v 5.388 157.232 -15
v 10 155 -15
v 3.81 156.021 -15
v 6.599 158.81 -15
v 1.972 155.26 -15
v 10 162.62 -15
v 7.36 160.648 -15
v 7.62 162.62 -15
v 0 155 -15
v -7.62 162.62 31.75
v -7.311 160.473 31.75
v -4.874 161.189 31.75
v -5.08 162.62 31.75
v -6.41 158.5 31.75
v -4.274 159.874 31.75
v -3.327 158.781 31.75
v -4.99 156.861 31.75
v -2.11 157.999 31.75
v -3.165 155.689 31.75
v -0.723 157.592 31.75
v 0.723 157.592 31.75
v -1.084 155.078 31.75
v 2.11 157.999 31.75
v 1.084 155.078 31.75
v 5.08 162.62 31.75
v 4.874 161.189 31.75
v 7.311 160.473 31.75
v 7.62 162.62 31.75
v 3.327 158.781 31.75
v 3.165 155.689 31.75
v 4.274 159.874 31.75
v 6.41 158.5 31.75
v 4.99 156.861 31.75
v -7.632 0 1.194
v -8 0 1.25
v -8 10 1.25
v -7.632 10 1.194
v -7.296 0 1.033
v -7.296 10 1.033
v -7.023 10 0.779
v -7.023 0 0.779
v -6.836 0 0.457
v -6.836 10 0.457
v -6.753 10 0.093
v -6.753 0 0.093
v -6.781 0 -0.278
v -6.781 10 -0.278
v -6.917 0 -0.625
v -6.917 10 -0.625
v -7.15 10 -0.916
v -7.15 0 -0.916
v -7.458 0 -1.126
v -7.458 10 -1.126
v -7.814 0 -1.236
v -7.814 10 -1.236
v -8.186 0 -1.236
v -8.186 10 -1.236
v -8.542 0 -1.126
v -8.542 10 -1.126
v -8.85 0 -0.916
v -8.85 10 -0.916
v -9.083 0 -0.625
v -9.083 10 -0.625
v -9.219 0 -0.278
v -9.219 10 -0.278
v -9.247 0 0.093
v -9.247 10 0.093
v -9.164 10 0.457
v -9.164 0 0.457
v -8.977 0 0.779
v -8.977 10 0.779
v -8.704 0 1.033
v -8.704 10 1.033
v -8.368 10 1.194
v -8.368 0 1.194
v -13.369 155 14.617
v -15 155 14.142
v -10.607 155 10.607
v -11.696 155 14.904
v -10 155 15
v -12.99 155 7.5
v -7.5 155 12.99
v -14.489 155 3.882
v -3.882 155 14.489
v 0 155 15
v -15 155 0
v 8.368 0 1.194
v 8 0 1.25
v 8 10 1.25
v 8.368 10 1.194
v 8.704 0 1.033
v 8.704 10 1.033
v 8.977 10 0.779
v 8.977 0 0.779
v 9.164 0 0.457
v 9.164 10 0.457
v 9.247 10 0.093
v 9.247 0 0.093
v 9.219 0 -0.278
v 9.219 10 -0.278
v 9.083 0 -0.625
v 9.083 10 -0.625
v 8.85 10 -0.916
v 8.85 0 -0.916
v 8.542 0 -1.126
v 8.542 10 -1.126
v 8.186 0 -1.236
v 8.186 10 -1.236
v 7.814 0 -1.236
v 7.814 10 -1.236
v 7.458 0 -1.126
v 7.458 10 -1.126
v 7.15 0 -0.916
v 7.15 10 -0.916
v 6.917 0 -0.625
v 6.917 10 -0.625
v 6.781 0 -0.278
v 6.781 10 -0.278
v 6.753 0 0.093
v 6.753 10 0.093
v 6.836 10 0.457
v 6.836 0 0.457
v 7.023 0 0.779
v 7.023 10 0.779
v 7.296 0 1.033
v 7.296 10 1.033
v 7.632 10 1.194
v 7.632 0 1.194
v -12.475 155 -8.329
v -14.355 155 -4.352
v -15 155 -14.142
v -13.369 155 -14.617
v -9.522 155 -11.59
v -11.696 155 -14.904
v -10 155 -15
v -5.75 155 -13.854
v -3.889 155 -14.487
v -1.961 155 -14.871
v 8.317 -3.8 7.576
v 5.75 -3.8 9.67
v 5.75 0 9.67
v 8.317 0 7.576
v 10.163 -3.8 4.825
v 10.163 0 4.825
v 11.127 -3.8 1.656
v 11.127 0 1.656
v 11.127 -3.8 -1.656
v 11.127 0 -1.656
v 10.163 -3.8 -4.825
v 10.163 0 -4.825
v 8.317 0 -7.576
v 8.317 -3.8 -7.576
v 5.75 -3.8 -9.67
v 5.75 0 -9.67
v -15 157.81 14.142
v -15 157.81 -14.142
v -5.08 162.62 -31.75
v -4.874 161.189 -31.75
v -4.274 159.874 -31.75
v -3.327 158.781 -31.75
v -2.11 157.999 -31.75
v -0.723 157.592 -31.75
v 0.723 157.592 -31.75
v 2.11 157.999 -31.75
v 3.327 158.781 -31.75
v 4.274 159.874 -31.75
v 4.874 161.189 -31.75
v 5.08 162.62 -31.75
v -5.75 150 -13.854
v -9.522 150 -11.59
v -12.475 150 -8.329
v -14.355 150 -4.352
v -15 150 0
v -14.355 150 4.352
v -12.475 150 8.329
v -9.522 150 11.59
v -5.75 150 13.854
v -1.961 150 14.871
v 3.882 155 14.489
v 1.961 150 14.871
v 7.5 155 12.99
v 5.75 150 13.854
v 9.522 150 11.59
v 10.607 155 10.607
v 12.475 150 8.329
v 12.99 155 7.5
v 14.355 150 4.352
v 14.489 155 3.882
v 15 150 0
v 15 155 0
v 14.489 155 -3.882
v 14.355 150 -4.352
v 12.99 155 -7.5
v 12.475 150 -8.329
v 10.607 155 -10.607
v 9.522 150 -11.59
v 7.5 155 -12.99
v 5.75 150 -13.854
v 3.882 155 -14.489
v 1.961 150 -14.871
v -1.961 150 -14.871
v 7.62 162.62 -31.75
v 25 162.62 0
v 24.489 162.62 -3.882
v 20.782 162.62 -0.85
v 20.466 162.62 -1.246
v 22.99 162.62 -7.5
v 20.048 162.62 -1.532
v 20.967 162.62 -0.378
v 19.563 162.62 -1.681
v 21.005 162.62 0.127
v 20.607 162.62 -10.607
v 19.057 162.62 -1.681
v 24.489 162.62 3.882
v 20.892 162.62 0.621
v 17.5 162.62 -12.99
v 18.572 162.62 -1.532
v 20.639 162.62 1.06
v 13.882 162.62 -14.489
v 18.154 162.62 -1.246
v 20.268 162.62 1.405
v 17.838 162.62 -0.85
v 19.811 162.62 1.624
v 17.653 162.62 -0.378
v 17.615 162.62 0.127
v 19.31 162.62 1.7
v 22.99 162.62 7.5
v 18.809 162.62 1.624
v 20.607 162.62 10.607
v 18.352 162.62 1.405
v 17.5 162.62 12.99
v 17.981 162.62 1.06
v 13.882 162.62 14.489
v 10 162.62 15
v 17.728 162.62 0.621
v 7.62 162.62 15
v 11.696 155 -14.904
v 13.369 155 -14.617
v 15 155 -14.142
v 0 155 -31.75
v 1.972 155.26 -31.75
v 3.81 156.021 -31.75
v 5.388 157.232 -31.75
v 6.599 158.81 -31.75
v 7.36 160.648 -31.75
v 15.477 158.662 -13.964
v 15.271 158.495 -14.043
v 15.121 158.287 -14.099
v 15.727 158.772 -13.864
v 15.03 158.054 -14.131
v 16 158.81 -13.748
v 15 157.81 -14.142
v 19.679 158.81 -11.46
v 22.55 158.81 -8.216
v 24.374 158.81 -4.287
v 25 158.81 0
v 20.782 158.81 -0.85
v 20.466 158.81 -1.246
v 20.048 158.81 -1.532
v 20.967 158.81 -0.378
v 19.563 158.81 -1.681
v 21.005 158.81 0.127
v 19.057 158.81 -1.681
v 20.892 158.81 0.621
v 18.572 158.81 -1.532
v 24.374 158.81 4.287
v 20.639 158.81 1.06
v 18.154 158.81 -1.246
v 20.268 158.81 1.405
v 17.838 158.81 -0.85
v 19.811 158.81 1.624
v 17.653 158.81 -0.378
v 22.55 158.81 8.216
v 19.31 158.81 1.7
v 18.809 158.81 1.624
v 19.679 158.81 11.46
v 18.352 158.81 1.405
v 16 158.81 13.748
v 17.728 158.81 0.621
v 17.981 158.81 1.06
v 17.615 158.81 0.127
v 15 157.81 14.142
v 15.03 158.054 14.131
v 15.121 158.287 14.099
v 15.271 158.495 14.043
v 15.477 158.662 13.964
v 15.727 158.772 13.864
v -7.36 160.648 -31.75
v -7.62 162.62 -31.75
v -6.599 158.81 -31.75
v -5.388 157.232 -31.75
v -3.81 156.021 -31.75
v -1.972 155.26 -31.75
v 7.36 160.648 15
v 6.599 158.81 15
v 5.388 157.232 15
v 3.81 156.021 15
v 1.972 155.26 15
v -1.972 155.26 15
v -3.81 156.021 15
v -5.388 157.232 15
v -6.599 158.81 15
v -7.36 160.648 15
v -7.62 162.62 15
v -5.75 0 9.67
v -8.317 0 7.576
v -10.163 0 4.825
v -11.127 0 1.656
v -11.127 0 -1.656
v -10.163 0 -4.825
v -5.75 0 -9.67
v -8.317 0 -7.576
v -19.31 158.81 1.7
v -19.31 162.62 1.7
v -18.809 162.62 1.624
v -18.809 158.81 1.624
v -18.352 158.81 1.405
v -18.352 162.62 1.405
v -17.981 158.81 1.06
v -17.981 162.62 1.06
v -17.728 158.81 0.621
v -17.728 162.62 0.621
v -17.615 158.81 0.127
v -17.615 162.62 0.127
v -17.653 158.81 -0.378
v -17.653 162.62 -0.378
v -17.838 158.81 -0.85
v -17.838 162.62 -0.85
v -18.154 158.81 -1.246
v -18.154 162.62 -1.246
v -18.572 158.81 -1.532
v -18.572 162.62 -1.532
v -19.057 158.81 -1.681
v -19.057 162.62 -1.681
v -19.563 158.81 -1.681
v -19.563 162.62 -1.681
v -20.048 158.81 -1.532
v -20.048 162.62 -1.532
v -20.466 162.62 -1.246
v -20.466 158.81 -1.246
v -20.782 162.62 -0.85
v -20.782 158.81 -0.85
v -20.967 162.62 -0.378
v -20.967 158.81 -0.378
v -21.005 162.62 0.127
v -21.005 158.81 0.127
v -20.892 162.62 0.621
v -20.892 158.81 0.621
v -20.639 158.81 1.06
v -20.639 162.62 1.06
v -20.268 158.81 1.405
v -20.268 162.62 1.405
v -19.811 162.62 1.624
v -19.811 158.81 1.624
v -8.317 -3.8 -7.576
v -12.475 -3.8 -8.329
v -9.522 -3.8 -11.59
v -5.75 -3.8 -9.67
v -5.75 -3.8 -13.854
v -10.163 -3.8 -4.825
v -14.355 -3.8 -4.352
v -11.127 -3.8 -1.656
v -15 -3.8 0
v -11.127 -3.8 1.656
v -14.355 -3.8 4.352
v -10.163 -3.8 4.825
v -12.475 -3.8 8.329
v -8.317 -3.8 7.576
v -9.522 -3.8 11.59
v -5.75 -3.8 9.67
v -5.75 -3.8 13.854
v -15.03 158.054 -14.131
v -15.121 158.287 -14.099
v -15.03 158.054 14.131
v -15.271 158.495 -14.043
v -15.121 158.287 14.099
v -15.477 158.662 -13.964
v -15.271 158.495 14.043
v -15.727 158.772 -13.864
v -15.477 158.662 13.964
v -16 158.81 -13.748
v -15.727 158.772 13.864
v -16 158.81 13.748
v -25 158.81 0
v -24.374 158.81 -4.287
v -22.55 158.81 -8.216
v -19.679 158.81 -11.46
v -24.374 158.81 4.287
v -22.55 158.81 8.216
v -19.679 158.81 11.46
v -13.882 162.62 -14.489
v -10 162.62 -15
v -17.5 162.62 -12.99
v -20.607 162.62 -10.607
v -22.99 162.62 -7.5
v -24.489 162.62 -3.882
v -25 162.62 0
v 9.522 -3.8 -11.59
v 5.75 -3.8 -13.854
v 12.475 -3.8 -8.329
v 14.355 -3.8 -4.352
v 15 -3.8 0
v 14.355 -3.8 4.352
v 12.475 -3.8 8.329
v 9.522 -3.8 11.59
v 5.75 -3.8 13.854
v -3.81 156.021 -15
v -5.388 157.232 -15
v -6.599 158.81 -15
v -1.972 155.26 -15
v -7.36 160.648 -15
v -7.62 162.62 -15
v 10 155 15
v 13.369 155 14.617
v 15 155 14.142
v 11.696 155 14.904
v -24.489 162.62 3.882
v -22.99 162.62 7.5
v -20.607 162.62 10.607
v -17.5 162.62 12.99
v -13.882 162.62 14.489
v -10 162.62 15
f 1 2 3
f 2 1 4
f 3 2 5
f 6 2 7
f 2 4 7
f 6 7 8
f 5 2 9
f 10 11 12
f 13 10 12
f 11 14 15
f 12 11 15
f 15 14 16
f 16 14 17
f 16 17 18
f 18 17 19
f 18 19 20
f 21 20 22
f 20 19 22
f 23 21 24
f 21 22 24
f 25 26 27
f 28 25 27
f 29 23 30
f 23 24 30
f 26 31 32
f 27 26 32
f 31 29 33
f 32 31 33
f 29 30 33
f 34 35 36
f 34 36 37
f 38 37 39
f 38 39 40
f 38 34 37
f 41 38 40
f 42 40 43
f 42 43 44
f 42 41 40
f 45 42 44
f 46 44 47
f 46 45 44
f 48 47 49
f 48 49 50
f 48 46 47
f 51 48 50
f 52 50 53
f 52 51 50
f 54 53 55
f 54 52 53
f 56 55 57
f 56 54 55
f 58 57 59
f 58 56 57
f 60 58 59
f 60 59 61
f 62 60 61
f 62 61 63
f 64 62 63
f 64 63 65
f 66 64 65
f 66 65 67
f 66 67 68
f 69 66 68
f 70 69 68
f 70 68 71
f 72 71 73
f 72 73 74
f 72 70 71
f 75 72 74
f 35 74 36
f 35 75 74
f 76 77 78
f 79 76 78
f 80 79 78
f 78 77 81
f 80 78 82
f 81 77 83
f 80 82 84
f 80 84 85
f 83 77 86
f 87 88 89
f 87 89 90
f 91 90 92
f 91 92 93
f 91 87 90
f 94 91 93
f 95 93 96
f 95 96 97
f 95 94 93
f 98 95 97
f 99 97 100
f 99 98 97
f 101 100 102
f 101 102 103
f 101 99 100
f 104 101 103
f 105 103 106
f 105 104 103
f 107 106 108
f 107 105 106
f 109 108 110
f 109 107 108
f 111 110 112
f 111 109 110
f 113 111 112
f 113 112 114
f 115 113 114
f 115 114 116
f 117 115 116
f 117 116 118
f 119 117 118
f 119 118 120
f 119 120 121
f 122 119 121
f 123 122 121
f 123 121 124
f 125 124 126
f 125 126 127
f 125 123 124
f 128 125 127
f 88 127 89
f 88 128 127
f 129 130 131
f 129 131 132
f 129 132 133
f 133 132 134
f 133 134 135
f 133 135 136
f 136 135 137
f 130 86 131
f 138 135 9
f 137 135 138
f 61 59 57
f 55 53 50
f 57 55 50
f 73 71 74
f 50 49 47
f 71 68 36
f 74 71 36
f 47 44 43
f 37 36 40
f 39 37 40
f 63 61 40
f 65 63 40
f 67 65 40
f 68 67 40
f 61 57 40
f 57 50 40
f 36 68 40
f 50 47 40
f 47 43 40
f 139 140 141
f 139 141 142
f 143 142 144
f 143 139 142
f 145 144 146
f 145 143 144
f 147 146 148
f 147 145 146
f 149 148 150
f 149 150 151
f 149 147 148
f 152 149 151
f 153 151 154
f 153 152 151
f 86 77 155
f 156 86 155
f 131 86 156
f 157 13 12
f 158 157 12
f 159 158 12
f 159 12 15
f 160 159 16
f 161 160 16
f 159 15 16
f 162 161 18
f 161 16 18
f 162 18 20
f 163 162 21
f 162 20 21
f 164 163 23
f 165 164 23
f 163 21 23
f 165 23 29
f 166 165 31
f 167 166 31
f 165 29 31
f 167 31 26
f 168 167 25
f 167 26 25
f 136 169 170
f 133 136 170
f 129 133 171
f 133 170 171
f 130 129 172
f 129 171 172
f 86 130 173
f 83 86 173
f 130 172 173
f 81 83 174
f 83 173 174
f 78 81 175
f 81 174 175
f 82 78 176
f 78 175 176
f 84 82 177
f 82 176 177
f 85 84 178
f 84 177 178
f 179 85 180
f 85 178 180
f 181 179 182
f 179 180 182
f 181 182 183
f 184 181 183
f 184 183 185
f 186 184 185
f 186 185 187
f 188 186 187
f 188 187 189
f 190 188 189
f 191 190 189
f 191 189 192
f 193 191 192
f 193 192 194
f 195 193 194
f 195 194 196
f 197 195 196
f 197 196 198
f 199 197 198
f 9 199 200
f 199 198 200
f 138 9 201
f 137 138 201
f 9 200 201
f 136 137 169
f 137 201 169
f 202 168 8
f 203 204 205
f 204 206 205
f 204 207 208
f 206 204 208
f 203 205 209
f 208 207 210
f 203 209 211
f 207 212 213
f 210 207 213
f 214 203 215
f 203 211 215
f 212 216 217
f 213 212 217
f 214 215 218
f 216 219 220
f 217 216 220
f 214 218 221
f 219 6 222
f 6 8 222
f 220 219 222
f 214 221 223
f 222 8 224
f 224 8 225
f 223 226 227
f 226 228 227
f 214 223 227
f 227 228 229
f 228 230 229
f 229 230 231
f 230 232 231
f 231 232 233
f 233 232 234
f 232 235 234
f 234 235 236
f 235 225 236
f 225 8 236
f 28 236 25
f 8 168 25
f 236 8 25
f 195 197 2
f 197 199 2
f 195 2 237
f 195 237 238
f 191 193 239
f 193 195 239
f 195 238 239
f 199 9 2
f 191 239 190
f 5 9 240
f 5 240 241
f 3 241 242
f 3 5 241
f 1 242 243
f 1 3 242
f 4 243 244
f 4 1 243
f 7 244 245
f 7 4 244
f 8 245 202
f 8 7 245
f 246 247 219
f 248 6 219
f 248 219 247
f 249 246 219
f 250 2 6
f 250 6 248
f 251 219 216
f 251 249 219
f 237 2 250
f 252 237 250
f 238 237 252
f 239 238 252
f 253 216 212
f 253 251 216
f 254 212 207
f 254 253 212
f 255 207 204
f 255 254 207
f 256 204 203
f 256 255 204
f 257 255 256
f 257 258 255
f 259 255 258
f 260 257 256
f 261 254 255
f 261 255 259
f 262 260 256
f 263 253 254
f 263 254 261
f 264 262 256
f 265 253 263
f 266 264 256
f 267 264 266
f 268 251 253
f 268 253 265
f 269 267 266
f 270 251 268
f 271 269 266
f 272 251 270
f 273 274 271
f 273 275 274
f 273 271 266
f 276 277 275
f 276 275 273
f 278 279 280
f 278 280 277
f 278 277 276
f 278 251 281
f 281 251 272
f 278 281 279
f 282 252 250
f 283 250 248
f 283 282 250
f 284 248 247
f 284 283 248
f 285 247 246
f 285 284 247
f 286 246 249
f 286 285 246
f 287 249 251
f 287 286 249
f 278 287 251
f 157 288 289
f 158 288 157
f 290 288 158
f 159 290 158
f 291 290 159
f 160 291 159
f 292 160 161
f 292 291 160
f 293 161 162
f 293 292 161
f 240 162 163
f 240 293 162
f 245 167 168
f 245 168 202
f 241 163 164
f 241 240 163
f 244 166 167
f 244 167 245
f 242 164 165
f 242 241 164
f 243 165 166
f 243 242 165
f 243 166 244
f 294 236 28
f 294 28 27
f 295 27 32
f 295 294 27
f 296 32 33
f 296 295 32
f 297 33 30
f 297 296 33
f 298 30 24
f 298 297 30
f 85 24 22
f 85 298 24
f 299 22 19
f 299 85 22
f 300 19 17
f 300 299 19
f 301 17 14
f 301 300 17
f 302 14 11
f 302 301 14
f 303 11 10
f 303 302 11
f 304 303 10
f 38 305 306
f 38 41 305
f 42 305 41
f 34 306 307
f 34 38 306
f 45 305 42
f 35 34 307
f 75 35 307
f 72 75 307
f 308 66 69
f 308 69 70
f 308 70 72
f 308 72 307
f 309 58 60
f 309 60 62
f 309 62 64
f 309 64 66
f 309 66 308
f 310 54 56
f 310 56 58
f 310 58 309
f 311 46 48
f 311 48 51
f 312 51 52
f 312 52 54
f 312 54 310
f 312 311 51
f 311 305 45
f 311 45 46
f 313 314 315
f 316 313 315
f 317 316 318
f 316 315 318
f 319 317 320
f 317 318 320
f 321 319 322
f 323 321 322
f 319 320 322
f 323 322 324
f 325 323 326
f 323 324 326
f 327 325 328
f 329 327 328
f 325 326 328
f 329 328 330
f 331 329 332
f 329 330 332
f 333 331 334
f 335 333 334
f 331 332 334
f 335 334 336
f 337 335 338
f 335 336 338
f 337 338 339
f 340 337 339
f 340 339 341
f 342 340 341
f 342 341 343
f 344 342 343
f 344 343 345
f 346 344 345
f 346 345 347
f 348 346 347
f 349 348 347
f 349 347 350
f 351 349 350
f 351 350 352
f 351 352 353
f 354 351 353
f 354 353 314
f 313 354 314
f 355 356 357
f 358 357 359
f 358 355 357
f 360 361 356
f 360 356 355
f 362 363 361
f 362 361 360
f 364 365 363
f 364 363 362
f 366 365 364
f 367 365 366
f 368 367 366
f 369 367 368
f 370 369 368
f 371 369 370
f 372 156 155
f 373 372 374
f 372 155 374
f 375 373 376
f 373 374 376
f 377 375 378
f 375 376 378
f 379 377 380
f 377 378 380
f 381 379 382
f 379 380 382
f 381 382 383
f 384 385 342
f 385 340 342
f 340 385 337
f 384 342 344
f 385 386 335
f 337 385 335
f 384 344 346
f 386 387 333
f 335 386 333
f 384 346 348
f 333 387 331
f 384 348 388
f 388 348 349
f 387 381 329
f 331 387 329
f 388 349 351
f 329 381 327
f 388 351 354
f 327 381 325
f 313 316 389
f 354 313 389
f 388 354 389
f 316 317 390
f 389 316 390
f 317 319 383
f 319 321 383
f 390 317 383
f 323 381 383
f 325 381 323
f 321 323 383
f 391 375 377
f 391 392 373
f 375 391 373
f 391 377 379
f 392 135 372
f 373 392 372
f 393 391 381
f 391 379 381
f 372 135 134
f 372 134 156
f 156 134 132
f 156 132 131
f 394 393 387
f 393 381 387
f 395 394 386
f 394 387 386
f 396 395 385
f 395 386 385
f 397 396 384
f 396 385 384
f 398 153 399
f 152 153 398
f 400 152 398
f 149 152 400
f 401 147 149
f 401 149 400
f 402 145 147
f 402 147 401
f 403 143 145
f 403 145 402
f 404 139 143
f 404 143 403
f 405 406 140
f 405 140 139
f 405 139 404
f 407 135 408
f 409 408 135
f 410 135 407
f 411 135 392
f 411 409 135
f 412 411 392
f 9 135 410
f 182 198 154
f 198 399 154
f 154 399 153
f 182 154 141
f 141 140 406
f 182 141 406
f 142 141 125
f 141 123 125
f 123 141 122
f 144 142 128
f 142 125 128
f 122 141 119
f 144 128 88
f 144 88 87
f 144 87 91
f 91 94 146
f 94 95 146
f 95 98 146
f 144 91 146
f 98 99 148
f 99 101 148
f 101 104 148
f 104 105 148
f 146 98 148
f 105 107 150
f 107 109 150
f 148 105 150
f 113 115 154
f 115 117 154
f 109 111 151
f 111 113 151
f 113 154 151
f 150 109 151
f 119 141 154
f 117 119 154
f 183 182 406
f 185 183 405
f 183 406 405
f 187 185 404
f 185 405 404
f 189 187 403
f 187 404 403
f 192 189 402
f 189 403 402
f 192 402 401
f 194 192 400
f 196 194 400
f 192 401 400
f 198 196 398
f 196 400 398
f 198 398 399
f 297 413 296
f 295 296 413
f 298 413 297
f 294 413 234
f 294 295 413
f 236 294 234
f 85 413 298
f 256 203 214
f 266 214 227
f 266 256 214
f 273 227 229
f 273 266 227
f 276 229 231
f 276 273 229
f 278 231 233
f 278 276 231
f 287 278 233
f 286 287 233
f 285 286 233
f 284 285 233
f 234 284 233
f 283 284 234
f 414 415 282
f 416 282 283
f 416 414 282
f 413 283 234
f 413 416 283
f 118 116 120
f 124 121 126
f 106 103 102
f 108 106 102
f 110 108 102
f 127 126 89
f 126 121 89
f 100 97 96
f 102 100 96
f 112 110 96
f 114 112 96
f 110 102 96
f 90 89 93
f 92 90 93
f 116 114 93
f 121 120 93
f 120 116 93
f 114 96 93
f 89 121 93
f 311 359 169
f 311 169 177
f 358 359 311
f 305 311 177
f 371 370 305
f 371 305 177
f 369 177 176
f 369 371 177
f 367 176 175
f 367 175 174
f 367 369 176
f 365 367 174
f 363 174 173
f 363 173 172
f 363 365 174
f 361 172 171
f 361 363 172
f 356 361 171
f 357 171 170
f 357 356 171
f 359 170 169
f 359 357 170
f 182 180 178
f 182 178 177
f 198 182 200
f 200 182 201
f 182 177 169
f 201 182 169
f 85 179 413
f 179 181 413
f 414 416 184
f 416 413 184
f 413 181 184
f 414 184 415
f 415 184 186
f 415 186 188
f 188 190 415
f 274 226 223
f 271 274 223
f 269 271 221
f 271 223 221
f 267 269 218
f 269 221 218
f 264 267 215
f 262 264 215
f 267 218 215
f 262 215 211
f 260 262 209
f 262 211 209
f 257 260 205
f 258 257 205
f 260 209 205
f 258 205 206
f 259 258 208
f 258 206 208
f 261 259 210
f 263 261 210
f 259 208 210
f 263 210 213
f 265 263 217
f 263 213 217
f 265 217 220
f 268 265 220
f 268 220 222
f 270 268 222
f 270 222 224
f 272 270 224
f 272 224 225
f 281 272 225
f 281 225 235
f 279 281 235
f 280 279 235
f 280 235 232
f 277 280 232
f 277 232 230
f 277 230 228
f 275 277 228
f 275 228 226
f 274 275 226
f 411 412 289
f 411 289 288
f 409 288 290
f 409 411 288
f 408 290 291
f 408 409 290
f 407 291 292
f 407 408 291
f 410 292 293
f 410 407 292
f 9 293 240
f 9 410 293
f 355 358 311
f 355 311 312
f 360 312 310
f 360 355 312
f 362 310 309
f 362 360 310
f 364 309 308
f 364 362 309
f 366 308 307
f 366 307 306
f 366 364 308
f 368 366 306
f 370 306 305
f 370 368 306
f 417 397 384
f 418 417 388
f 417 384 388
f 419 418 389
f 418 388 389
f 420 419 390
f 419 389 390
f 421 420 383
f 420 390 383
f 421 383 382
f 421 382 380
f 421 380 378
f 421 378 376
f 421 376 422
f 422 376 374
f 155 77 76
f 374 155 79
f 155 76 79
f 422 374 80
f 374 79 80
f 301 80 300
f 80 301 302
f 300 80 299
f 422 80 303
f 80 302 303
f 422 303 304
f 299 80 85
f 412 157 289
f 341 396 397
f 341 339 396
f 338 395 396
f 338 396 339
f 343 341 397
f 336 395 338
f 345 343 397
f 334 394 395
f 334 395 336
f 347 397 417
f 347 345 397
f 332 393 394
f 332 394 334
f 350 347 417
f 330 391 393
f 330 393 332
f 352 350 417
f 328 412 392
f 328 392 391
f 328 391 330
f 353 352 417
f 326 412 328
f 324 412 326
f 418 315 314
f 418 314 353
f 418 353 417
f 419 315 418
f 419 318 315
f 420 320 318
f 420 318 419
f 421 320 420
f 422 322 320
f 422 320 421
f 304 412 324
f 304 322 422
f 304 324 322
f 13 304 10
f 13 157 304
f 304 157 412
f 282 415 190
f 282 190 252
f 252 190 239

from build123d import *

# Parameters (mm, degrees)
BOSS_EXTRUDE1_DEPTH   = 150
BOSS_EXTRUDE1_2_DEPTH = 150
SKETCH2_R             = 15
BOSS_EXTRUDE2_DEPTH   = 5
SKETCH3_W             = 30
SKETCH3_H             = 63.5
BOSS_EXTRUDE3_DEPTH   = 15.24
SKETCH4_R             = 5.08
CUT_EXTRUDE1_DEPTH    = 183.315406919
CUT_EXTRUDE3_START    = -16.75
CUT_EXTRUDE3_DEPTH    = 16.75
CUT_EXTRUDE4_START    = -16.75
CUT_EXTRUDE4_DEPTH    = 16.75
SKETCH7_W             = 63.5
SKETCH7_H             = 7.62
CUT_EXTRUDE5_DEPTH    = 176.754715726
SKETCH8_W             = 30
SKETCH8_H             = 3.81
BOSS_EXTRUDE4_DEPTH   = 10
CUT_EXTRUDE6_START    = -7.62
CUT_EXTRUDE6_DEPTH    = 7.62
SKETCH1_4_R           = 1.25
CUT_EXTRUDE7_DEPTH    = 10
BOSS_EXTRUDE5_START   = 3.8
BOSS_EXTRUDE5_DEPTH   = 3.8
FILLET1_R             = 1
CUT_EXTRUDE8_REACH    = 173.256
SKETCH9_R             = 1.7


# Read off the part's stored shape, not the designer's step: Cut-Extrude6
with BuildPart() as part:
    # Sketch1 → Boss-Extrude1 (new body)
    with BuildSketch(Plane(origin=(0, 0, 0), x_dir=(1, 0, 0), z_dir=(0, 1, 0))):
        with BuildLine():
            Line((-5.75, 13.854151002), (-5.75, -13.854151002))
            ThreePointArc((-5.75, -13.854151002), (-15, 0), (-5.75, 13.854151002))
        make_face()
    extrude(amount=BOSS_EXTRUDE1_DEPTH)



with BuildPart() as body_2:
    # Sketch1 → Boss-Extrude1 2 (new body)
    with BuildSketch(Plane(origin=(0, 0, 0), x_dir=(1, 0, 0), z_dir=(0, 1, 0))):
        with BuildLine():
            Line((5.75, 13.854151002), (5.75, -13.854151002))
            ThreePointArc((5.75, -13.854151002), (15, 0), (5.75, 13.854151002))
        make_face()
    extrude(amount=BOSS_EXTRUDE1_2_DEPTH)


with BuildPart() as part_1:
    add(part.part)

    add(body_2.part)  # Boss-Extrude2 merges body 2
    # Sketch2 → Boss-Extrude2 (add)
    with BuildSketch(Plane(origin=(0, 150, 0), x_dir=(1, 0, 0), z_dir=(0, 1, 0))):
        with Locations(Location((0, 0, 0), (0, 0, 112.540310464))):
            Circle(SKETCH2_R)
    extrude(amount=BOSS_EXTRUDE2_DEPTH)

    # Sketch3 → Boss-Extrude3 (add)
    with BuildSketch(Plane(origin=(0, 155, 0), x_dir=(1, 0, 0), z_dir=(0, 1, 0))):
        Rectangle(SKETCH3_W, SKETCH3_H)
    extrude(amount=BOSS_EXTRUDE3_DEPTH)

    # Sketch4 → Cut-Extrude1 (cut, through all)
    with BuildSketch(Plane.XY.offset(31.75)):
        with Locations((0, 162.62)):
            Circle(SKETCH4_R)
    extrude(amount=-CUT_EXTRUDE1_DEPTH, mode=Mode.SUBTRACT)

    # Sketch6 → Cut-Extrude3 (cut)
    with BuildSketch(Plane(origin=(0, 0, -31.75), x_dir=(-1, 0, 0), z_dir=(0, 0, -1)).offset(CUT_EXTRUDE3_START)):
        with BuildLine():
            ThreePointArc((-9.9e-08, 170.24), (7.62, 162.62000005), (0, 155))
            Line((0, 155), (15, 155))
            Line((15, 155), (15, 170.24))
            Line((15, 170.24), (-9.9e-08, 170.24))
        make_face()
        with BuildLine():
            ThreePointArc((0, 155), (-7.62, 162.61999995), (-9.9e-08, 170.24))
            Line((-9.9e-08, 170.24), (-15, 170.24))
            Line((-15, 170.24), (-15, 155))
            Line((-15, 155), (0, 155))
        make_face()
    extrude(amount=CUT_EXTRUDE3_DEPTH, mode=Mode.SUBTRACT)

    # Sketch4<4> → Cut-Extrude4 (cut)
    with BuildSketch(Plane.XY.offset(31.75).offset(CUT_EXTRUDE4_START)):
        with BuildLine():
            ThreePointArc((-9.9e-08, 170.24), (7.62, 162.62000005), (0, 155))
            Line((0, 155), (15, 155))
            Line((15, 155), (15, 170.24))
            Line((15, 170.24), (-9.9e-08, 170.24))
        make_face()
        with BuildLine():
            ThreePointArc((0, 155), (-7.62, 162.61999995), (-9.9e-08, 170.24))
            Line((-9.9e-08, 170.24), (-15, 170.24))
            Line((-15, 170.24), (-15, 155))
            Line((-15, 155), (0, 155))
        make_face()
    extrude(amount=CUT_EXTRUDE4_DEPTH, mode=Mode.SUBTRACT)

    # Sketch7 → Cut-Extrude5 (cut, through all)
    with BuildSketch(Plane.ZY.offset(15)):
        with Locations((0, 166.43)):
            Rectangle(SKETCH7_W, SKETCH7_H)
    extrude(amount=-CUT_EXTRUDE5_DEPTH, mode=Mode.SUBTRACT)

    # Sketch8 → Boss-Extrude4 (add)
    with BuildSketch(Plane.ZY.offset(15)):
        with Locations((0, 160.715)):
            Rectangle(SKETCH8_W, SKETCH8_H)
    boss_extrude4 = extrude(amount=BOSS_EXTRUDE4_DEPTH)

    # Mirror2: Boss-Extrude4 across plane
    add(boss_extrude4.mirror(Plane(origin=(0, 0, 0), x_dir=(0, 0, 1), z_dir=(1, 0, 0))))

    # Cut-Extrude6 outline → Cut-Extrude6 (cut)
    with BuildSketch(Plane(origin=(0, 162.62, 0), x_dir=(1, 0, 0), z_dir=(0, 1, 0)).offset(CUT_EXTRUDE6_START)):
        with BuildLine():
            Line((25, 15), (10, 15))
            ThreePointArc((10, 15), (20.606601718, 10.606601718), (25, 0))
            Line((25, 0), (25, 15))
        make_face()
        with BuildLine():
            Line((25, -15), (25, 0))
            ThreePointArc((25, 0), (20.606601718, -10.606601718), (10, -15))
            Line((10, -15), (25, -15))
        make_face()
    cut_extrude6 = extrude(amount=CUT_EXTRUDE6_DEPTH, mode=Mode.SUBTRACT)

    # Mirror3: Cut-Extrude6 across plane
    add(cut_extrude6.mirror(Plane(origin=(0, 0, 0), x_dir=(0, 0, 1), z_dir=(1, 0, 0))), mode=Mode.SUBTRACT)

    # Sketch1<4> → Cut-Extrude7 (cut)
    with BuildSketch(Plane(origin=(0, 0, 0), x_dir=(1, 0, 0), z_dir=(0, 1, 0))):
        with Locations(Location((-8, 0, 0), (0, 0, 270))):
            Circle(SKETCH1_4_R)
        with Locations(Location((8, 0, 0), (0, 0, 270))):
            Circle(SKETCH1_4_R)
    extrude(amount=CUT_EXTRUDE7_DEPTH, mode=Mode.SUBTRACT)

    # Sketch12 → Boss-Extrude5 (add)
    with BuildSketch(Plane.XZ.offset(BOSS_EXTRUDE5_START)):
        with BuildLine():
            Line((-5.75, 9.669539803), (-5.75, 13.854151002))
            ThreePointArc((-5.75, 13.854151002), (-15, 0), (-5.75, -13.854151002))
            Line((-5.75, -13.854151002), (-5.75, -9.669539803))
            ThreePointArc((-5.75, -9.669539803), (-11.25, 0), (-5.75, 9.669539803))
        make_face()
        with BuildLine():
            ThreePointArc((5.75, -13.854151002), (15, 0), (5.75, 13.854151002))
            Line((5.75, 13.854151002), (5.75, 9.669539803))
            ThreePointArc((5.75, 9.669539803), (11.25, 0), (5.75, -9.669539803))
            Line((5.75, -9.669539803), (5.75, -13.854151002))
        make_face()
    extrude(amount=-BOSS_EXTRUDE5_DEPTH)

    # Fillet1
    fillet1_edges = [part_1.edges().sort_by_distance(p)[0] for p in [
        (15, 158.81, 0),
        (-15, 158.81, 0),
    ]]
    fillet(fillet1_edges, radius=FILLET1_R)

    # Sketch9 → Cut-Extrude8 (cut, up to next)
    with BuildSketch(Plane(origin=(0, 162.62, 0), x_dir=(1, 0, 0), z_dir=(0, 1, 0)), mode=Mode.PRIVATE) as cut_extrude8_sk1:
        with Locations(Location((-19.31, 0, 0), (0, 0, 270))):
            Circle(SKETCH9_R)
    cut_extrude8_tool1 = extrude(cut_extrude8_sk1.sketch, amount=-CUT_EXTRUDE8_REACH, mode=Mode.PRIVATE) & part_1.part
    # Sketch9 → Cut-Extrude8 (cut, up to next)
    with BuildSketch(Plane(origin=(0, 162.62, 0), x_dir=(1, 0, 0), z_dir=(0, 1, 0)), mode=Mode.PRIVATE) as cut_extrude8_sk2:
        with Locations(Location((19.31, 0, 0), (0, 0, 270))):
            Circle(SKETCH9_R)
    cut_extrude8_tool2 = extrude(cut_extrude8_sk2.sketch, amount=-CUT_EXTRUDE8_REACH, mode=Mode.PRIVATE) & part_1.part
    add(cut_extrude8_tool1.solids().sort_by_distance((-19.31, 162.62, 0))[0], mode=Mode.SUBTRACT)
    add(cut_extrude8_tool2.solids().sort_by_distance((19.31, 162.62, 0))[0], mode=Mode.SUBTRACT)


solid = part_1.part
